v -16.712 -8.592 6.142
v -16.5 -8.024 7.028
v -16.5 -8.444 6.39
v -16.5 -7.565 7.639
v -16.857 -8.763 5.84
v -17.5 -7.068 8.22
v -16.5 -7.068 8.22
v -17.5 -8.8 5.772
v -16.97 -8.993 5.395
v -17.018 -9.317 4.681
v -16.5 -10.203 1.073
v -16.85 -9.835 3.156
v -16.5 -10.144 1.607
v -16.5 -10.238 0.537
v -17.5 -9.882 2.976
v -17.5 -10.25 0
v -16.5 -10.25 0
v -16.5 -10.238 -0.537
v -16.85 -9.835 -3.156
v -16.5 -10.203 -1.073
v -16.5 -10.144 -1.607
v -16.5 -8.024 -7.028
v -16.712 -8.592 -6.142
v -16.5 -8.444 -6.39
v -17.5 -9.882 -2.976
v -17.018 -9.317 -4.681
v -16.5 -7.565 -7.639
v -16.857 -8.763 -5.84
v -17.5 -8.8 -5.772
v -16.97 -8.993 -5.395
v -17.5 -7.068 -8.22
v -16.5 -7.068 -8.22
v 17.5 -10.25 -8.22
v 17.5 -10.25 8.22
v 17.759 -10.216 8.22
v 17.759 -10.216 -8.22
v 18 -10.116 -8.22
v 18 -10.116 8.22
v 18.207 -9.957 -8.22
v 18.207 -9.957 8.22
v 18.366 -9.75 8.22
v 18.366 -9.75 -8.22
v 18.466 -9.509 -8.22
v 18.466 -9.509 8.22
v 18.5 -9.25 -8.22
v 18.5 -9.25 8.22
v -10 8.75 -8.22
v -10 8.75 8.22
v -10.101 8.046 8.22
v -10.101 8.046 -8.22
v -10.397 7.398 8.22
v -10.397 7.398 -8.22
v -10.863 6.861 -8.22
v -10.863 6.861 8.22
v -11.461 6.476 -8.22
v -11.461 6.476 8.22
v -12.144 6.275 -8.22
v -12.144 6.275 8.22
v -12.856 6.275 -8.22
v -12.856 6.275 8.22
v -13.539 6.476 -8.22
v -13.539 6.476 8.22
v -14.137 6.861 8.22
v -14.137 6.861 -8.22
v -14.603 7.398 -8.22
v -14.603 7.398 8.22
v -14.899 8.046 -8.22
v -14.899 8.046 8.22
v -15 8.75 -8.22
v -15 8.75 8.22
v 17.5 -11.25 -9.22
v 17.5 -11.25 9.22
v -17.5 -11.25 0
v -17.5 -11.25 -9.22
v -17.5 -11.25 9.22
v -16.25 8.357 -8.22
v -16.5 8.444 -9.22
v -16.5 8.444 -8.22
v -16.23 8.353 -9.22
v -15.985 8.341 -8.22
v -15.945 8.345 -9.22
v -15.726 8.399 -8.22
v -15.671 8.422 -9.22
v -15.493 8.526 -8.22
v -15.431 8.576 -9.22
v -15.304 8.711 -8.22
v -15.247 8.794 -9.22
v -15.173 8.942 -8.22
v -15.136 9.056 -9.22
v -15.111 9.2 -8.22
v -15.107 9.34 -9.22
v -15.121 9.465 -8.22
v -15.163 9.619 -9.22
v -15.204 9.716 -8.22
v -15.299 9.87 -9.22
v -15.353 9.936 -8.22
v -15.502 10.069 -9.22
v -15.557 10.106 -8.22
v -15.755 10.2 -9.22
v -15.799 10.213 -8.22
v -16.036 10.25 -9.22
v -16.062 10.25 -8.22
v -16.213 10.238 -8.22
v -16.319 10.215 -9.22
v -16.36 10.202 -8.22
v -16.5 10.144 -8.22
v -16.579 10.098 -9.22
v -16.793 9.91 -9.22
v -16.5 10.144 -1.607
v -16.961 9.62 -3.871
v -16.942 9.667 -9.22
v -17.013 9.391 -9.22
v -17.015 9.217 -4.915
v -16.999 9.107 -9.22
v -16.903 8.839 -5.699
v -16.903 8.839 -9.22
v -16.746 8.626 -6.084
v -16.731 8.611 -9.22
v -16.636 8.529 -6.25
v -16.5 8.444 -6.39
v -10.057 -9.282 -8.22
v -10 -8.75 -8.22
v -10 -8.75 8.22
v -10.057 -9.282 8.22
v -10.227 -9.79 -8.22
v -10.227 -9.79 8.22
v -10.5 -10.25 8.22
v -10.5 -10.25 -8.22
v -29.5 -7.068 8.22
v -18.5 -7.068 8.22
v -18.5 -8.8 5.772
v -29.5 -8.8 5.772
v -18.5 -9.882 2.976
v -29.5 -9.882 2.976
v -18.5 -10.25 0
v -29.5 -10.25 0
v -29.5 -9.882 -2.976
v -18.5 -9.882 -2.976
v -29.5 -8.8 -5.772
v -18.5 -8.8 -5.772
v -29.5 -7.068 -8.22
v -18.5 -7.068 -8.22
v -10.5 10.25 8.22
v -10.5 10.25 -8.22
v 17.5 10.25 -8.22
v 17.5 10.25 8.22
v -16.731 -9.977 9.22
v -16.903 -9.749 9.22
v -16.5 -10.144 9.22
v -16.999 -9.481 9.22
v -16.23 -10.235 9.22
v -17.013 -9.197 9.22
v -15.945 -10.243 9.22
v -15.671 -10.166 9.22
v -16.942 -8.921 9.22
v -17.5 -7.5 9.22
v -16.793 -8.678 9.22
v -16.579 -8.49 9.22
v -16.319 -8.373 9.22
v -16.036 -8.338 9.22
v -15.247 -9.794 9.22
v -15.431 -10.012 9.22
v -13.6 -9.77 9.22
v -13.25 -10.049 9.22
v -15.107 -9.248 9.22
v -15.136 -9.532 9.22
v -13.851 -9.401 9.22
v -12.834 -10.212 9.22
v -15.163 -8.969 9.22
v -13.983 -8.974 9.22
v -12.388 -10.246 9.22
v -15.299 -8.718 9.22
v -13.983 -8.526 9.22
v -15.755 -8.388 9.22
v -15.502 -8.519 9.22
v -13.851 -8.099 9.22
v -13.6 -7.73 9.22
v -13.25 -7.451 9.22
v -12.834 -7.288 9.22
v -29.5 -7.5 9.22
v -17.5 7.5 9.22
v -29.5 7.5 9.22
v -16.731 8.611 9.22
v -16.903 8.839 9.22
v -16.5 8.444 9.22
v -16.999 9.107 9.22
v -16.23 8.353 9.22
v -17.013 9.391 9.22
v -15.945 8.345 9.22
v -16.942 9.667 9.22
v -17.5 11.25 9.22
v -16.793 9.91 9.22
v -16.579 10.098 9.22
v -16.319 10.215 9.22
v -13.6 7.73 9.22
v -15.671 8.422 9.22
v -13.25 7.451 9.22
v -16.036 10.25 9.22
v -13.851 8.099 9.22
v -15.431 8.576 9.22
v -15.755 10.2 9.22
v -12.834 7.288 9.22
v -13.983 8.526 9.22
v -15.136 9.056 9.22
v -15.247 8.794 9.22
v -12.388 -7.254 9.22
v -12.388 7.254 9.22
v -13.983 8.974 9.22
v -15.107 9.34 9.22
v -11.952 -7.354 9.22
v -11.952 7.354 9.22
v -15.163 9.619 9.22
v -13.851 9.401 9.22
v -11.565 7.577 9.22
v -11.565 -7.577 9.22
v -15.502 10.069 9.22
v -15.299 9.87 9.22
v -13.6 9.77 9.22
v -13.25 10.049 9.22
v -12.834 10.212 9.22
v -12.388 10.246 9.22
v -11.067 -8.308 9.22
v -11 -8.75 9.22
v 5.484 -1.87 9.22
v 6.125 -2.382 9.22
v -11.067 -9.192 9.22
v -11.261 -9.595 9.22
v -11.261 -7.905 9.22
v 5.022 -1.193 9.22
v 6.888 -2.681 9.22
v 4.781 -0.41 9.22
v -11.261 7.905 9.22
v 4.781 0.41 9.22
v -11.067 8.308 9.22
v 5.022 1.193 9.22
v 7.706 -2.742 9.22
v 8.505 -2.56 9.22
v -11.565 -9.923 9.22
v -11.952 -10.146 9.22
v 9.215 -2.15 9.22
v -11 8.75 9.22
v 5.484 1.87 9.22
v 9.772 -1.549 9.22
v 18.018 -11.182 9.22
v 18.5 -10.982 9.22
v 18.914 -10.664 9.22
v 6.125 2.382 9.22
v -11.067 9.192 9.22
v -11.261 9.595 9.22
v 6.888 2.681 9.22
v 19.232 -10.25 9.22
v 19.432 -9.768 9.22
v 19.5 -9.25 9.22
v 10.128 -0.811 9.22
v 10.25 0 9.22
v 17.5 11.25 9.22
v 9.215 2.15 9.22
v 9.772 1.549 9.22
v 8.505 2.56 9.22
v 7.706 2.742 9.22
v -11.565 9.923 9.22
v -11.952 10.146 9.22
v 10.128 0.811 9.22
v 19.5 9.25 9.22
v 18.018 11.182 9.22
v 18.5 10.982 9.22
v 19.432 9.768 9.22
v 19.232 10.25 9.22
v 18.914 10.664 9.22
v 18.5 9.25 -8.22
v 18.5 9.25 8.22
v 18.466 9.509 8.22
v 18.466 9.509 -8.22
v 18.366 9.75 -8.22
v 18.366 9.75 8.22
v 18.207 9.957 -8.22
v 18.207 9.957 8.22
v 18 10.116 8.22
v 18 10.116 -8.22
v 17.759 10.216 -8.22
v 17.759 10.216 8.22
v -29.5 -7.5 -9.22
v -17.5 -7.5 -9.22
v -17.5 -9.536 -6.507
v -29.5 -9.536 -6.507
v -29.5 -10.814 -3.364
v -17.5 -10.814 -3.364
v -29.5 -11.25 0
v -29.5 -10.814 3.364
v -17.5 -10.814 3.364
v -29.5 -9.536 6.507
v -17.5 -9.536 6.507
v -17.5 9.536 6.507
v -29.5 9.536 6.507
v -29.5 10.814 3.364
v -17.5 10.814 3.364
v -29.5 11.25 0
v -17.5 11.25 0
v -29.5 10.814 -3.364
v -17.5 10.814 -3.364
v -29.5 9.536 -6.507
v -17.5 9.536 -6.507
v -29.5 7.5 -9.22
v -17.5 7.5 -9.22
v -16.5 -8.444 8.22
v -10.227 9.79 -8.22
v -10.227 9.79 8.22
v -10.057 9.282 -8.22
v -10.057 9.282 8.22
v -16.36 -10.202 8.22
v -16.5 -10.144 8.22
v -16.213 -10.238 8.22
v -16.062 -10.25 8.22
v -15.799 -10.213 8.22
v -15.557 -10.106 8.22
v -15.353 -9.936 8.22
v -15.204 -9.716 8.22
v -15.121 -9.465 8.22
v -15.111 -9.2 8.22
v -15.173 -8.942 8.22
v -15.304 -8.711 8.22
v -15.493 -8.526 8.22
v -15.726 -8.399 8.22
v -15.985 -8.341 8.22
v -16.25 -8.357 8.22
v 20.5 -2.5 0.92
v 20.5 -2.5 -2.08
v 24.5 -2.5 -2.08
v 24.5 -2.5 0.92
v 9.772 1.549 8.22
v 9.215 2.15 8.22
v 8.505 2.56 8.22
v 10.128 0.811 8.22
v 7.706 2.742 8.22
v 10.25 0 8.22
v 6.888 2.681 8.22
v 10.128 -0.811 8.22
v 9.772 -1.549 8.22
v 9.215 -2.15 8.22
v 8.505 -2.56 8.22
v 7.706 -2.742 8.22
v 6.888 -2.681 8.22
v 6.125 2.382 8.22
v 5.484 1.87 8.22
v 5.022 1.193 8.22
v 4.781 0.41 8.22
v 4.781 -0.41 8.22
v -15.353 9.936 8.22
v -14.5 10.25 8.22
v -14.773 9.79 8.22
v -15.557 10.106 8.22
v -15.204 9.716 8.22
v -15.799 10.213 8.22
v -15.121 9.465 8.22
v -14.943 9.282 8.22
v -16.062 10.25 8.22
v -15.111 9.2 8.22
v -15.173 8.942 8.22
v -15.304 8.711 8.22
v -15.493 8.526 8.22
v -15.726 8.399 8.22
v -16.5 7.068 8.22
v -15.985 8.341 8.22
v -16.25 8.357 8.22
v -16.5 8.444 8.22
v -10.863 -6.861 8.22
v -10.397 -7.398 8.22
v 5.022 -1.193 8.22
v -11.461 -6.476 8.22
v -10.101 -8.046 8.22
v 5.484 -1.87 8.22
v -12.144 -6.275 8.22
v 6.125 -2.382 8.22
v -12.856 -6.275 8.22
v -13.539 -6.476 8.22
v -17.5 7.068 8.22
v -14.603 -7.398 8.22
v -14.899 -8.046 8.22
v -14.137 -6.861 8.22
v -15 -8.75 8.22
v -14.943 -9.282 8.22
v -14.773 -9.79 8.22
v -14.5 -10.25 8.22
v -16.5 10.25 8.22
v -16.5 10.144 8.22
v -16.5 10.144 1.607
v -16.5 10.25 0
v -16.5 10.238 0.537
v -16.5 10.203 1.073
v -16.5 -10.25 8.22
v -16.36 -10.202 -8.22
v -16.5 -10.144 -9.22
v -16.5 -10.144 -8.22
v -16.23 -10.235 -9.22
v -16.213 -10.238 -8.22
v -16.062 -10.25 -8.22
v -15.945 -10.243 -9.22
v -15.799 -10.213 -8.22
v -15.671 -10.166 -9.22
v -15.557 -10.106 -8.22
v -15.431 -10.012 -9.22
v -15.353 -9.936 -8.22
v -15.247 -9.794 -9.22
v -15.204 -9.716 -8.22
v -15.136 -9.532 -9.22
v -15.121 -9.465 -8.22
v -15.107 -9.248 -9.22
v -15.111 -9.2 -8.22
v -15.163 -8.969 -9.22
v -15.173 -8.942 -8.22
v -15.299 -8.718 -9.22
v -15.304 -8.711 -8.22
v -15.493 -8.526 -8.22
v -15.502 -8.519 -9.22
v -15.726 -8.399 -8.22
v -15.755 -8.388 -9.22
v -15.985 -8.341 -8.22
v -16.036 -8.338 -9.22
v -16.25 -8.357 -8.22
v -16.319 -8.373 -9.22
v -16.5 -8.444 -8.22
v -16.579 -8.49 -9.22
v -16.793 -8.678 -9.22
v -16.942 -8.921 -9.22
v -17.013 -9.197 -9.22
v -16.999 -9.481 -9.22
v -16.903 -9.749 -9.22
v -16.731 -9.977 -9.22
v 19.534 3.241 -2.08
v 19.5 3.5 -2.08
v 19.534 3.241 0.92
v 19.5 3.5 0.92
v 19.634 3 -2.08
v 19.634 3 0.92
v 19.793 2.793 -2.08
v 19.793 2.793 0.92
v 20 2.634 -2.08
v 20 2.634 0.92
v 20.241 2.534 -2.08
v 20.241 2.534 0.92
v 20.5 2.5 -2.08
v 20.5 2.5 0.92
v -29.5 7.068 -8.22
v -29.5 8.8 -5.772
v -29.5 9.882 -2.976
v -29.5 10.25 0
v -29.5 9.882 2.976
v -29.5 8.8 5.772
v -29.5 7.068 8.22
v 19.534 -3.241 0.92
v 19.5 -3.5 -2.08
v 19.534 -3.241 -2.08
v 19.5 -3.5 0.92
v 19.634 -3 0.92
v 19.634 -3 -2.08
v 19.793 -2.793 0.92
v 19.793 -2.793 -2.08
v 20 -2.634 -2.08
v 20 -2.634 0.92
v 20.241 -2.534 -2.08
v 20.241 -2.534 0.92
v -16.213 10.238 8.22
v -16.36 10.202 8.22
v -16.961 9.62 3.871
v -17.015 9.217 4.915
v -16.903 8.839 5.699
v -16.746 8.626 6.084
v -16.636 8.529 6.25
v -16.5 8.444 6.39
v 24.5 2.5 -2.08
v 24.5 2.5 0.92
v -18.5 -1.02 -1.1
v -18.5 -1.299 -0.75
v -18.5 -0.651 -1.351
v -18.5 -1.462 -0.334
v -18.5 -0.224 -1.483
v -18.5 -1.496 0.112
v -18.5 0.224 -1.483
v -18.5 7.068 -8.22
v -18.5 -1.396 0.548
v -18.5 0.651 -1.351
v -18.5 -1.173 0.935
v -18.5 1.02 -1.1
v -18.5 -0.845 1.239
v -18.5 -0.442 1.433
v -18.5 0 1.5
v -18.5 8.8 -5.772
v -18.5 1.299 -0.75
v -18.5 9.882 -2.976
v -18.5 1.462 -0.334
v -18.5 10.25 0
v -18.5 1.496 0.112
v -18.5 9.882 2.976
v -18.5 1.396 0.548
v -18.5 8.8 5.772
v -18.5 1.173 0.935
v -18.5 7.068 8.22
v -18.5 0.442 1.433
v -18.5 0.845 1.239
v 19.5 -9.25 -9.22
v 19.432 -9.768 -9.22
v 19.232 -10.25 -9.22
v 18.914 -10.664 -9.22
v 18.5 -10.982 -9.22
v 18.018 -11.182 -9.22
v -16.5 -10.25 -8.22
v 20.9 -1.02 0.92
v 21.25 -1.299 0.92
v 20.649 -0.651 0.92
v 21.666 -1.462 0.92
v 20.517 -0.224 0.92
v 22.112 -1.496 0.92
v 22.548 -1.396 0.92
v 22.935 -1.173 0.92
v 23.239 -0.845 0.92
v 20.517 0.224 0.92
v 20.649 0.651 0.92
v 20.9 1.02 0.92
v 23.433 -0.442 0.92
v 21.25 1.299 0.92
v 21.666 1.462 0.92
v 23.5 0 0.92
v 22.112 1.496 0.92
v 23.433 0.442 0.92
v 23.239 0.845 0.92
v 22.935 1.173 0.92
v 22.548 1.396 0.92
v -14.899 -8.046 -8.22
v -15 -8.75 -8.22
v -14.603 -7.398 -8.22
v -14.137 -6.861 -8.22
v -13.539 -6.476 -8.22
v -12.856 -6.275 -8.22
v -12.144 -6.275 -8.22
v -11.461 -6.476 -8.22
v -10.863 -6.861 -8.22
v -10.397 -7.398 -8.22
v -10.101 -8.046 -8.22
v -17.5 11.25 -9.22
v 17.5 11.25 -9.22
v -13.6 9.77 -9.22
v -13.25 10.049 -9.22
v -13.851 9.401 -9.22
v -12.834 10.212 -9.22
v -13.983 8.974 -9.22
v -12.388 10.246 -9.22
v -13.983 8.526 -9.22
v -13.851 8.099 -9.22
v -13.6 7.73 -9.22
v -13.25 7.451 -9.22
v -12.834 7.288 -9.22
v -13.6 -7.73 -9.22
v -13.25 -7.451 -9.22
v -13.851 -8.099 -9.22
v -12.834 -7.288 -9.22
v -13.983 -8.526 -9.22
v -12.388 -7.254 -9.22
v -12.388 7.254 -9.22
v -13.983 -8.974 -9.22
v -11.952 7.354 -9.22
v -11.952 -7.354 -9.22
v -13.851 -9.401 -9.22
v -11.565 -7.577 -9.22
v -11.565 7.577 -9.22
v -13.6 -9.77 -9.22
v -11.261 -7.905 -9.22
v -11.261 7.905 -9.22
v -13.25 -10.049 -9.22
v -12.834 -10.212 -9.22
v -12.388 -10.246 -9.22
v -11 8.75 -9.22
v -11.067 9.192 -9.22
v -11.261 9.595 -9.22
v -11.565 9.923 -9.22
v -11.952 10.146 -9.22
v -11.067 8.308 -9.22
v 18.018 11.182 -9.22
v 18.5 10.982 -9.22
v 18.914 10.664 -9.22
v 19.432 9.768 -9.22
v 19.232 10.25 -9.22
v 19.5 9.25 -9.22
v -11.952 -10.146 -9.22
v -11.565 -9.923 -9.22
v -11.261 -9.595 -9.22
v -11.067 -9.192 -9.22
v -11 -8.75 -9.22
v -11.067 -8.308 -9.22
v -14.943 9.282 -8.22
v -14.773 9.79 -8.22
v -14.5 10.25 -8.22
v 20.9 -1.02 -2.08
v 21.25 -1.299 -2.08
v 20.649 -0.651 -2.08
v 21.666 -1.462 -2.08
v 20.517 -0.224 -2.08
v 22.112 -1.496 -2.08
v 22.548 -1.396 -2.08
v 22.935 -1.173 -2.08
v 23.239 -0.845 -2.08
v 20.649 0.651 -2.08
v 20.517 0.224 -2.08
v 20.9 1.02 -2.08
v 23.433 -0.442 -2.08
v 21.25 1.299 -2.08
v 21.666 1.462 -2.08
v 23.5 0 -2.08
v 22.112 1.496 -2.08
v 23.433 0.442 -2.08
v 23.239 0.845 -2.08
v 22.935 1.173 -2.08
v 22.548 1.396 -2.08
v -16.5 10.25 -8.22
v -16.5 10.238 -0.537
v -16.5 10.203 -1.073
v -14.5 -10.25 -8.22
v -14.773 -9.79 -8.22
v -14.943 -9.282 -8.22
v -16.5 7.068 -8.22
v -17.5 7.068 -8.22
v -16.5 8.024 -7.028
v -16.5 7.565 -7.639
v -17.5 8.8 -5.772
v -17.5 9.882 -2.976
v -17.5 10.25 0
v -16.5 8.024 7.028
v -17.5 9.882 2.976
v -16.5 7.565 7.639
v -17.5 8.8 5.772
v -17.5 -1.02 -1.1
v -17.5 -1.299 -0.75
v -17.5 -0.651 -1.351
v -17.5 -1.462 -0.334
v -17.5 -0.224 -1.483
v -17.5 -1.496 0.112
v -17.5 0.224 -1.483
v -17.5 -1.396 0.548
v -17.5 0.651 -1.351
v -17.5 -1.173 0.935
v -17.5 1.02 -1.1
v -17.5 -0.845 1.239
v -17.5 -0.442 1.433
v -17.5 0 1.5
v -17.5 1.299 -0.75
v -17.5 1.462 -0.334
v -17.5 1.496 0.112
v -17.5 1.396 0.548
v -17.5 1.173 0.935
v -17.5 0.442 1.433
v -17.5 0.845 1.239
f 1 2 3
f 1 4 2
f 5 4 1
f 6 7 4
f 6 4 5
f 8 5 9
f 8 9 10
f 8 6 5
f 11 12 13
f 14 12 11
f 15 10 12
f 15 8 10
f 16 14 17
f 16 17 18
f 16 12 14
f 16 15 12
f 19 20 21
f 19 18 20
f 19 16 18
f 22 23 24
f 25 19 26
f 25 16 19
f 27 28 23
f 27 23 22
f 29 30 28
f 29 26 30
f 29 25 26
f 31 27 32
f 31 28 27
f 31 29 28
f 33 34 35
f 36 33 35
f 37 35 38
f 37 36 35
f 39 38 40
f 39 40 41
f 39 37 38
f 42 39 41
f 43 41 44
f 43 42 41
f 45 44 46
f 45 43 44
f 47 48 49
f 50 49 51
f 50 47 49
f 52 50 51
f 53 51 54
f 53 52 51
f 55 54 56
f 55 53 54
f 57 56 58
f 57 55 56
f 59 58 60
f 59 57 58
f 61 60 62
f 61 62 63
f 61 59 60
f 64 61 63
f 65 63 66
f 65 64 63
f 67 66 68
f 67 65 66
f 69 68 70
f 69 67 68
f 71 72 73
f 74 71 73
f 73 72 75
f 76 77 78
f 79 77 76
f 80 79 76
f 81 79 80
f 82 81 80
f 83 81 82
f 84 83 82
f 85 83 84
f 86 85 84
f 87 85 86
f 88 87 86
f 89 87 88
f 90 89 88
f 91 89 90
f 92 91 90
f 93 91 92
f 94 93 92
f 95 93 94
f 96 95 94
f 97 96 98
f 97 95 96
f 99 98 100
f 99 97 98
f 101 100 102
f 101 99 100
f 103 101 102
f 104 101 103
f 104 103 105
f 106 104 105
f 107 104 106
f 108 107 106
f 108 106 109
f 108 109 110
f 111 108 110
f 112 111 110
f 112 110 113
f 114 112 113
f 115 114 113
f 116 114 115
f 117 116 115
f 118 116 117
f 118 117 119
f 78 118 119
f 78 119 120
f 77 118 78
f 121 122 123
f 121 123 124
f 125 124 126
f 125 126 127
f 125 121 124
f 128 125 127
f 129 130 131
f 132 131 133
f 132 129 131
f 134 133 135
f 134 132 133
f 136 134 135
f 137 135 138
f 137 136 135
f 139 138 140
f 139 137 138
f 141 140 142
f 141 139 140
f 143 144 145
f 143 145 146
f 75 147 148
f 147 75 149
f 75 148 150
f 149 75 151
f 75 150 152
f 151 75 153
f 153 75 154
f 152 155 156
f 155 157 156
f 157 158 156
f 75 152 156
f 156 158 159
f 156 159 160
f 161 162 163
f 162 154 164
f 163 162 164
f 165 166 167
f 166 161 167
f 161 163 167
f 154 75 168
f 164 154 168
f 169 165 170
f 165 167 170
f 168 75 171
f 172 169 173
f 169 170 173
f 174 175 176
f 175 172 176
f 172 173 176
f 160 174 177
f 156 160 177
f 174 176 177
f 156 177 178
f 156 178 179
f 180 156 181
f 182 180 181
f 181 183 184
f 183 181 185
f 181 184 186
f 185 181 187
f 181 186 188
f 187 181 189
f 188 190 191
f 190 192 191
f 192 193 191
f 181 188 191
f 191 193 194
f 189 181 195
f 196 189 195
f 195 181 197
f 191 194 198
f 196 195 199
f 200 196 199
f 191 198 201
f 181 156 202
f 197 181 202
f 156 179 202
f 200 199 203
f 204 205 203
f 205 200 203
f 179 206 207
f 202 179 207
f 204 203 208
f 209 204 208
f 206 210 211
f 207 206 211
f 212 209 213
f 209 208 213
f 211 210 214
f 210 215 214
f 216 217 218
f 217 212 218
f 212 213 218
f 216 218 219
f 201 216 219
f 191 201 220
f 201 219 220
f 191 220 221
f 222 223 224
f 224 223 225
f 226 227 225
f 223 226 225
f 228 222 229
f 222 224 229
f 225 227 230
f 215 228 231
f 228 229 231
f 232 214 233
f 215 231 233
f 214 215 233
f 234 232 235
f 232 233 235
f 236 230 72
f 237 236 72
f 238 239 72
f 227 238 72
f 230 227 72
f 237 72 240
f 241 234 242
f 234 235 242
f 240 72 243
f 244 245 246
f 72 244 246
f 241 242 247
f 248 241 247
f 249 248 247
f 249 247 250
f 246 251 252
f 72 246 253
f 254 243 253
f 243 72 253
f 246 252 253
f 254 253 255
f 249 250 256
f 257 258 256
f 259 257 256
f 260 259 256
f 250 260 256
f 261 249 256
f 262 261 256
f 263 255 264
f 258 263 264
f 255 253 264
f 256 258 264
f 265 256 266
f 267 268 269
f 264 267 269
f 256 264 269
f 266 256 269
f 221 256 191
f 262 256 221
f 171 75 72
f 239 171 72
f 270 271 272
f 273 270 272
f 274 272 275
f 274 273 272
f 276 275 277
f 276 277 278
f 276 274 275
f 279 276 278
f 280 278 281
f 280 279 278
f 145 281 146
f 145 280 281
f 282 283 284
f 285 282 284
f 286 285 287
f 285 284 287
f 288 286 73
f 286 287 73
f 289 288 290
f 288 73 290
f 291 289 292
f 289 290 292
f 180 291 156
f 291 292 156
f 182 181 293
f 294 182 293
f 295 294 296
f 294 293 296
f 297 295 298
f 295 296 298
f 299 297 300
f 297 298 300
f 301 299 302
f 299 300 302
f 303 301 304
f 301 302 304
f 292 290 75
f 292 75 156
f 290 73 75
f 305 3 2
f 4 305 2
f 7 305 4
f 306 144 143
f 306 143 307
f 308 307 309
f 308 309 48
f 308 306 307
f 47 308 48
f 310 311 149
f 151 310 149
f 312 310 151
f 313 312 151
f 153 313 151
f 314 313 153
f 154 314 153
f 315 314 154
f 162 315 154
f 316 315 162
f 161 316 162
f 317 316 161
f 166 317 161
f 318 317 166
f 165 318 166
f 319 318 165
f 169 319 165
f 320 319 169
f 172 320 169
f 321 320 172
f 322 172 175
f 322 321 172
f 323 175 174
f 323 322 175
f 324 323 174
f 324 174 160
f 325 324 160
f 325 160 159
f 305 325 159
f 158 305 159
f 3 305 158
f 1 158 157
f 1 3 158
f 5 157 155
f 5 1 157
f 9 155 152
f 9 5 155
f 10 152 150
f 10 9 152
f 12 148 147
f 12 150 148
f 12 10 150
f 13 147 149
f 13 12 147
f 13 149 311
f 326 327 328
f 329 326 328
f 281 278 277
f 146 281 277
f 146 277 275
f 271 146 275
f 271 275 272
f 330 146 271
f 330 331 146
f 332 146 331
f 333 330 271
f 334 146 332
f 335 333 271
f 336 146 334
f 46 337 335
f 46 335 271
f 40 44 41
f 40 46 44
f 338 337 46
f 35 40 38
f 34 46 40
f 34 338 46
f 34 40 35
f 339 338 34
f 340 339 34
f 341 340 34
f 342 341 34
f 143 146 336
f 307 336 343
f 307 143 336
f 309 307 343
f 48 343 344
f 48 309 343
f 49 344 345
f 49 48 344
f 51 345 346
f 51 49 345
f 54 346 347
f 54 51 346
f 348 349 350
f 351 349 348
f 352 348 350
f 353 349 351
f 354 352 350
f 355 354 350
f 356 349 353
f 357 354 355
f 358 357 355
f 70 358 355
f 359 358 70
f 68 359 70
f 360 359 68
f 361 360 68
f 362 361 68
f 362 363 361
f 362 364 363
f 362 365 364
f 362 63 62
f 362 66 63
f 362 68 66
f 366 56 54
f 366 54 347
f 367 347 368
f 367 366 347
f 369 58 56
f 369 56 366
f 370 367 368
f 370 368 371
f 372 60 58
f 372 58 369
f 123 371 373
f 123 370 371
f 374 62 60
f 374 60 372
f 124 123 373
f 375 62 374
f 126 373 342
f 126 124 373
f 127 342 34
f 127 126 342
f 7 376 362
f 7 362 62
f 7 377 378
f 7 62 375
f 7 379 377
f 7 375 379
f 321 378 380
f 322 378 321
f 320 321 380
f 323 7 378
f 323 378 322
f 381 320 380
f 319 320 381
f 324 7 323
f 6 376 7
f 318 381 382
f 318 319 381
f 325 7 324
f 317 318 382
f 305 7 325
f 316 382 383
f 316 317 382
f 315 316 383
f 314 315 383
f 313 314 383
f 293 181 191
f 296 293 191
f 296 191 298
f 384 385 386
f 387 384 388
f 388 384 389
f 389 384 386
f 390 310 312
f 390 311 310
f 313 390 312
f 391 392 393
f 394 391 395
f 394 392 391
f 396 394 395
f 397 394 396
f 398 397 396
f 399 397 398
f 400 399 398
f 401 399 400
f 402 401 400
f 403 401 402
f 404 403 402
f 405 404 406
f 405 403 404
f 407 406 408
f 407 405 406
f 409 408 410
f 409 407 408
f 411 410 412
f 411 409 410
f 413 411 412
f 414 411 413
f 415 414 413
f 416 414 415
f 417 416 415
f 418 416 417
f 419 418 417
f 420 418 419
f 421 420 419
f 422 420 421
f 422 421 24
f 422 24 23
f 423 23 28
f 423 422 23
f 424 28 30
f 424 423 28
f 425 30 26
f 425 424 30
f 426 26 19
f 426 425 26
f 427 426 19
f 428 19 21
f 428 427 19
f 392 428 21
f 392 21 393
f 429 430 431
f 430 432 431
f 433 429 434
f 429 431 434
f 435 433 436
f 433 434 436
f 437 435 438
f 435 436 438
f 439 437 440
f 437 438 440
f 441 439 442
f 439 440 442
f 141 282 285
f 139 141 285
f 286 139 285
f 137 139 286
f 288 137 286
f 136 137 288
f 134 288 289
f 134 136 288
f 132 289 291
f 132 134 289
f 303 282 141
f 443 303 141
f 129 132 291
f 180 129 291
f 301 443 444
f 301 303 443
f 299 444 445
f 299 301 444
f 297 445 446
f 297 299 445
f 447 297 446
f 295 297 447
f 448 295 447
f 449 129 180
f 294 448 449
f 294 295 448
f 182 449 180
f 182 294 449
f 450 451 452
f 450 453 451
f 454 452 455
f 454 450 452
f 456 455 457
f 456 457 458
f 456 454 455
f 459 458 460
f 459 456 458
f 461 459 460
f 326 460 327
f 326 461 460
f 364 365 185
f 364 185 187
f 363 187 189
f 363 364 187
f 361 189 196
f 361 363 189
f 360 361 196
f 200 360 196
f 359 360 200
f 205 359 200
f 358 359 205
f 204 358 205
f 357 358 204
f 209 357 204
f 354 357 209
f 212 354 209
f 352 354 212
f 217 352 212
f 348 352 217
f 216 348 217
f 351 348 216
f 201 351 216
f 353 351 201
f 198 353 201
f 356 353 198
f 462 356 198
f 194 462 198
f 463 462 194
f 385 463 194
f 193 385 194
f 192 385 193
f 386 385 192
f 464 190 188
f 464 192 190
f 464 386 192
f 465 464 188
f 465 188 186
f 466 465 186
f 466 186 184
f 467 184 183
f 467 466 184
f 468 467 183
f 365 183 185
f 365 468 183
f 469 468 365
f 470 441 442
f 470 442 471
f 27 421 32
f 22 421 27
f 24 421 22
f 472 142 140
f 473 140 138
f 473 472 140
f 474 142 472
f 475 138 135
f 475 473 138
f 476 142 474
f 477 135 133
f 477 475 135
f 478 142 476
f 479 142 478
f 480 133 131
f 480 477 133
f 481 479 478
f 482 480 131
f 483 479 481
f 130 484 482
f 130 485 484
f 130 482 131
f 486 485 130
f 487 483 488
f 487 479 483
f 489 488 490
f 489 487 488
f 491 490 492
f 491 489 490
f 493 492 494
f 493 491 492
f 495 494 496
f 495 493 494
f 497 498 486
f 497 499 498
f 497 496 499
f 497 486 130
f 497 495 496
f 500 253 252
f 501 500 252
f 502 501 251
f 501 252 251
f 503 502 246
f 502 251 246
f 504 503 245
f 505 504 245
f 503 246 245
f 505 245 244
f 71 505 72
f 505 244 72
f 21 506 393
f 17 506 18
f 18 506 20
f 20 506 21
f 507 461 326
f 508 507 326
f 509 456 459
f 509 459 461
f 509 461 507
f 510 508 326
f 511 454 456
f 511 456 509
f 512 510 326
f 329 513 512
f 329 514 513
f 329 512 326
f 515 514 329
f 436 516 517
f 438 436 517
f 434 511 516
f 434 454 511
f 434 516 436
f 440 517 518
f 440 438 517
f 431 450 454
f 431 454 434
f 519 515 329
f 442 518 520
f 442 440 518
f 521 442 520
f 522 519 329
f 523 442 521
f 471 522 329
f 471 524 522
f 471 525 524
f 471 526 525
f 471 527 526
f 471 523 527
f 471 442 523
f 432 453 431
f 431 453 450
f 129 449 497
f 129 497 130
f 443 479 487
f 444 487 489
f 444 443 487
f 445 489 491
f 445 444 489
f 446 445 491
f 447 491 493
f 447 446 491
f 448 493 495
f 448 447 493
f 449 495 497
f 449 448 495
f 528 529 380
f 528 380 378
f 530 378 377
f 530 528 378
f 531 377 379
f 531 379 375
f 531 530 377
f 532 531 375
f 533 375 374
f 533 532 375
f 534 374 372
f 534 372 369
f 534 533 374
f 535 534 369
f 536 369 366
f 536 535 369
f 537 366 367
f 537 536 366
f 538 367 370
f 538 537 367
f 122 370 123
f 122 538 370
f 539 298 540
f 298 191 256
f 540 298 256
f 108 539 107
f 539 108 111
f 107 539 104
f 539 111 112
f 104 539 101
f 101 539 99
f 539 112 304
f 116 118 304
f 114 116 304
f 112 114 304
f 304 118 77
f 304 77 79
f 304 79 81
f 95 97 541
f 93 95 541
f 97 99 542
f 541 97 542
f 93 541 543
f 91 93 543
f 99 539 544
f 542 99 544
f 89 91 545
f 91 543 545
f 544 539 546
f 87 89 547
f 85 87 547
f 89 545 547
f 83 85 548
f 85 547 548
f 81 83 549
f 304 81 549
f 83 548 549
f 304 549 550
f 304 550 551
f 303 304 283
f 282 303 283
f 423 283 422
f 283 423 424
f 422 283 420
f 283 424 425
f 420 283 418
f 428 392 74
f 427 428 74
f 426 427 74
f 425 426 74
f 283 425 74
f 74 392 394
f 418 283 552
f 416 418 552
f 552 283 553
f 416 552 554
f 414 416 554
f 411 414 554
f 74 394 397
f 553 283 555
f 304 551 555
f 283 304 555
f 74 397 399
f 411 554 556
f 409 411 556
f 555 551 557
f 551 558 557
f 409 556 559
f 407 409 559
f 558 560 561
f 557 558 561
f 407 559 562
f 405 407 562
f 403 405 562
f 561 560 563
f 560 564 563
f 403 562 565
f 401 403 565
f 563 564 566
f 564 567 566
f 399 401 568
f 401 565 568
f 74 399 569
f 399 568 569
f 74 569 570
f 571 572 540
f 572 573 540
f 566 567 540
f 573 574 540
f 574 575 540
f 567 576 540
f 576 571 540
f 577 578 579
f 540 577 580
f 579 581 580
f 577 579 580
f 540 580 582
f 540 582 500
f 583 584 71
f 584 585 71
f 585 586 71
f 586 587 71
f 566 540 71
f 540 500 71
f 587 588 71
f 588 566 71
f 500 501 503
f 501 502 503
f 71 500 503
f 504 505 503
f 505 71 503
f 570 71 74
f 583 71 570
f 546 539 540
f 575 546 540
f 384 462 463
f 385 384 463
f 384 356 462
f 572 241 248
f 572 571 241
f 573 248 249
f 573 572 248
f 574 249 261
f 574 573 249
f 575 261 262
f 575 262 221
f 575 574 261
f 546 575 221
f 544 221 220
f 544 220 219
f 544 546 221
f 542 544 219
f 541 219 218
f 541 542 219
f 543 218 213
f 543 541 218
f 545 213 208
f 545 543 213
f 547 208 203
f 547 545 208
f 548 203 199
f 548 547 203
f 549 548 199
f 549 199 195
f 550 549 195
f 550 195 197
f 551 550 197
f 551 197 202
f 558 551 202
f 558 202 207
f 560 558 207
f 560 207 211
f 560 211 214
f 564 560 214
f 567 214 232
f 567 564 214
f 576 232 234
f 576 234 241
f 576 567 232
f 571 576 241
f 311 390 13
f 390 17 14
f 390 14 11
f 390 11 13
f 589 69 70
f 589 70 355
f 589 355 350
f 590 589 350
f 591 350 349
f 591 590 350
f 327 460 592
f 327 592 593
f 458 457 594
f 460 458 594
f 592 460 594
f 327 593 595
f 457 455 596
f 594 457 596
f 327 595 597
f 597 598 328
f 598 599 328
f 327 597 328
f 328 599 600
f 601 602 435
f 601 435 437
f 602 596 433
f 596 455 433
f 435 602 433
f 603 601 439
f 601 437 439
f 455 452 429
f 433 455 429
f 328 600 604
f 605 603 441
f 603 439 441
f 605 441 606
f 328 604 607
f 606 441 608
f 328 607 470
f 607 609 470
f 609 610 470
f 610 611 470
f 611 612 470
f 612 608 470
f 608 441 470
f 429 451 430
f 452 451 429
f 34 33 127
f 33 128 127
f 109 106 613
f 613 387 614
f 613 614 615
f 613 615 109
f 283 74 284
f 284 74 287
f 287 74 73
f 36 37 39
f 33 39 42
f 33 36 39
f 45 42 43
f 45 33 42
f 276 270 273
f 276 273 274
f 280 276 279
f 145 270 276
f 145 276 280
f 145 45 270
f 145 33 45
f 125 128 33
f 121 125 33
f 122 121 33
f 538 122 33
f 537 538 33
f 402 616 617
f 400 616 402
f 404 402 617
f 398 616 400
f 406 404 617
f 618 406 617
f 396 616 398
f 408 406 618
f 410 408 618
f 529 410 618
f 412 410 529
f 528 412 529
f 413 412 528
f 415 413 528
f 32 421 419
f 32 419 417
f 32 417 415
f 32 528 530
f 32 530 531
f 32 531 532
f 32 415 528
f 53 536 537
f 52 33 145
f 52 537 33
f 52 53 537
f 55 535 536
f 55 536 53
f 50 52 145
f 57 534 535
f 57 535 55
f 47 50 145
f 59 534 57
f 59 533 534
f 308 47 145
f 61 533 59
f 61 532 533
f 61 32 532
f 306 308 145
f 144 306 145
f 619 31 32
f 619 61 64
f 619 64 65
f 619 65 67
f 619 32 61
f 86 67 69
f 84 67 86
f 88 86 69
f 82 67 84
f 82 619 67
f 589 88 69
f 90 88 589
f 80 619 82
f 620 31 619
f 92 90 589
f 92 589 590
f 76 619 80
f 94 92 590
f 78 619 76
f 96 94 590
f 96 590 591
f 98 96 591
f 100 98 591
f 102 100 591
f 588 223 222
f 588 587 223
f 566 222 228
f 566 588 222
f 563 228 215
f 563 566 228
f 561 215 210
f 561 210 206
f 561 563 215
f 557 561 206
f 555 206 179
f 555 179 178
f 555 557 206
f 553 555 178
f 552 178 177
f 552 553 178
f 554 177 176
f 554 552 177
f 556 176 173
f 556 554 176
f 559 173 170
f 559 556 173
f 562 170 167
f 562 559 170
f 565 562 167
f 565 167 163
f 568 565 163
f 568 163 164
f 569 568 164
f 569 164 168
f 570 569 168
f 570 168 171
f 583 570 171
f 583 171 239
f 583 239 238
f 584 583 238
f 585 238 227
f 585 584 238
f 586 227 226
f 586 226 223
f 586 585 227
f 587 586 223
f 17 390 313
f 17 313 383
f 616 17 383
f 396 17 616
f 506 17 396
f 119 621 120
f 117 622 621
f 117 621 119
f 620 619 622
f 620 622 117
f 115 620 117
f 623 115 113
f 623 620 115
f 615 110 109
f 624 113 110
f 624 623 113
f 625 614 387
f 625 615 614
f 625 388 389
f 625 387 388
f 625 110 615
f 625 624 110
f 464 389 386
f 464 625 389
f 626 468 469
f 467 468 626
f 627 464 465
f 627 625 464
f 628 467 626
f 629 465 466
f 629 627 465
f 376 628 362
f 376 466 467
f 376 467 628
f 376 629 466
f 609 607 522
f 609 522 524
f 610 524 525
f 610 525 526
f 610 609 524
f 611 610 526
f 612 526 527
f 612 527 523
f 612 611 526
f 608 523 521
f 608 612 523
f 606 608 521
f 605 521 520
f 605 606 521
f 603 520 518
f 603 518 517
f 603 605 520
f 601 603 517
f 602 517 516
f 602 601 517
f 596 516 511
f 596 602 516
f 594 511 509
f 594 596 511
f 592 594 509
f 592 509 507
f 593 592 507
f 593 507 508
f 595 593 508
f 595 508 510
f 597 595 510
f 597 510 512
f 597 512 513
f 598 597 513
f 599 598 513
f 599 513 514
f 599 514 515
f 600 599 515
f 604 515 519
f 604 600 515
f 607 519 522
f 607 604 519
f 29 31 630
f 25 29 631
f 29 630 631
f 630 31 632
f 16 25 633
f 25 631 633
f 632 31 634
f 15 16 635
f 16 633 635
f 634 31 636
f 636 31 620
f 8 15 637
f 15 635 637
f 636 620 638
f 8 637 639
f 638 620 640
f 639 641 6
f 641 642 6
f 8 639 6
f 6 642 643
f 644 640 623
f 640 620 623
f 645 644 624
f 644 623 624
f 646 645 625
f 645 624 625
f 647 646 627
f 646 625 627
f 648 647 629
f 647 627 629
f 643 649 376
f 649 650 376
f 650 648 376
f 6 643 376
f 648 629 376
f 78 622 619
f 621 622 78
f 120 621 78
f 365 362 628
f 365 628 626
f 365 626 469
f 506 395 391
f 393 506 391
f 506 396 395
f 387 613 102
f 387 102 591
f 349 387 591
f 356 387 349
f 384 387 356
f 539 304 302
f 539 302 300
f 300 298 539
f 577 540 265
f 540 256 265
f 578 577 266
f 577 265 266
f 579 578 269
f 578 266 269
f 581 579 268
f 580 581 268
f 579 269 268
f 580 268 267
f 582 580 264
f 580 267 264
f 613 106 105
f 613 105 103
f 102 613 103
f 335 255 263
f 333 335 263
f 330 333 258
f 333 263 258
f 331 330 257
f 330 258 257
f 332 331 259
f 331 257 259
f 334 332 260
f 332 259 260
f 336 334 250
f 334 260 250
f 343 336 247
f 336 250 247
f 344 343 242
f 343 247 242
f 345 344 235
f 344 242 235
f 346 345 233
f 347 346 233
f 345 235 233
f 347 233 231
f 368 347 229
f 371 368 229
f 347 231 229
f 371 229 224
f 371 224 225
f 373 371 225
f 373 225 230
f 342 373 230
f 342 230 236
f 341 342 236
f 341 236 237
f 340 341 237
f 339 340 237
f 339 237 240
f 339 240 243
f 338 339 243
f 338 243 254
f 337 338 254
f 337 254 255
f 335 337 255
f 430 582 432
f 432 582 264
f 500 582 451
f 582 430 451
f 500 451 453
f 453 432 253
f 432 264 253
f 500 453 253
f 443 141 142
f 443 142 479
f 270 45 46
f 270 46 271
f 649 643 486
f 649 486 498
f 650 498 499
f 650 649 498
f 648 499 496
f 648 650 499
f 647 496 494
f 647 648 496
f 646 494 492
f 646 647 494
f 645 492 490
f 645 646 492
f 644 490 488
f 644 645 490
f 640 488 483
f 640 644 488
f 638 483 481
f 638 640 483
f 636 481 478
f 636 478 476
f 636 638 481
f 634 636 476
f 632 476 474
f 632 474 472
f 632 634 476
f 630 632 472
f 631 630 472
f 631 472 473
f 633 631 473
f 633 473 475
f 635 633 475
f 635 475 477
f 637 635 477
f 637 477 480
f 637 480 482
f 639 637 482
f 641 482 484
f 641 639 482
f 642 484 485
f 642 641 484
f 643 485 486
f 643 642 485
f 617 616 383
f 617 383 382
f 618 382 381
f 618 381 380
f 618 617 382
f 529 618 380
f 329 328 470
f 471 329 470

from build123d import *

# Parameters (mm, degrees)
SKETCH1_R                = 1.5
BOSS_EXTRUDE1_DEPTH      = 9.22
BOSS_EXTRUDE2_DEPTH      = 12
SHELL1_START             = -10
SHELL1_OUTLINE_W         = 20.5
SHELL1_OUTLINE_H         = 16.44
SHELL1_DEPTH             = 27.5
SHELL1_START_2           = -29.5
SHELL1_2_DEPTH           = 14.5
SHELL1_START_3           = -16.5
SHELL1_3_DEPTH           = 1.5
SHELL1_START_4           = -8.22
SHELL1_4_DEPTH           = 16.44
SKETCH3_R                = 1.5
BOSS_EXTRUDE3_DEPTH      = 1
BOSS_EXTRUDE4_DEPTH      = 1.5
BOSS_EXTRUDE4_DEPTH_BACK = 1.5
SKETCH6_W                = 5
SKETCH6_H                = 5
SKETCH6_R                = 1.5
SKETCH7_R                = 2.75
CUT_EXTRUDE1_DEPTH       = 3
FILLET1_R                = 1
CUT_EXTRUDE2_DEPTH       = 20
CUT_EXTRUDE2_DEPTH_BACK  = 20
SKETCH8_R                = 0.956029162


with BuildPart() as part:
    # Sketch1 → Boss-Extrude1 (new, symmetric)
    with BuildSketch(Plane.XY):
        with BuildLine():
            Line((17.5, -11.25), (-17.5, -11.25))
            Line((-17.5, -11.25), (-17.5, 11.25))
            Line((-17.5, 11.25), (17.5, 11.25))
            ThreePointArc((17.5, 11.25), (18.914213562, 10.664213562), (19.5, 9.25))
            Line((19.5, 9.25), (19.5, -9.25))
            ThreePointArc((19.5, -9.25), (18.914213562, -10.664213562), (17.5, -11.25))
        make_face()
        with Locations((-12.5, 8.75)):
            Circle(SKETCH1_R, mode=Mode.SUBTRACT)
        with Locations((-12.5, -8.75)):
            Circle(SKETCH1_R, mode=Mode.SUBTRACT)
    extrude(amount=BOSS_EXTRUDE1_DEPTH, both=True)

    # Sketch2 → Boss-Extrude2 (add)
    with BuildSketch(Plane.ZY.offset(17.5)):
        with BuildLine():
            Line((9.22, -7.5), (9.22, 7.5))
            ThreePointArc((9.22, 7.5), (0, 11.25), (-9.22, 7.5))
            Line((-9.22, 7.5), (-9.22, -7.5))
            ThreePointArc((-9.22, -7.5), (0, -11.25), (9.22, -7.5))
        make_face()
    extrude(amount=BOSS_EXTRUDE2_DEPTH)

    # Shell1: read off the stored shape, not the designer's step
    # Shell1 outline → Shell1 (cut)
    with BuildSketch(Plane.YZ.offset(SHELL1_START)):
        Rectangle(SHELL1_OUTLINE_W, SHELL1_OUTLINE_H)
    extrude(amount=SHELL1_DEPTH, mode=Mode.SUBTRACT)

    # Shell1 2 outline → Shell1 2 (cut)
    with BuildSketch(Plane.YZ.offset(SHELL1_START_2)):
        with BuildLine():
            ThreePointArc((7.068411902, -8.22), (10.25, 0), (7.068411902, 8.22))
            Line((7.068411902, 8.22), (-7.068411902, 8.22))
            ThreePointArc((-7.068411902, 8.22), (-10.25, 0), (-7.068411902, -8.22))
            Line((-7.068411902, -8.22), (7.068411902, -8.22))
        make_face()
    extrude(amount=SHELL1_2_DEPTH, mode=Mode.SUBTRACT)

    # Shell1 3 outline → Shell1 3 (cut)
    with BuildSketch(Plane.YZ.offset(SHELL1_START_3)):
        with BuildLine():
            Line((10.25, 0), (10.25, 8.22))
            Line((10.25, 8.22), (7.068411902, 8.22))
            ThreePointArc((7.068411902, 8.22), (9.426855331, 4.407122157), (10.25, 0))
        make_face()
        with BuildLine():
            Line((10.25, -8.22), (10.25, 0))
            ThreePointArc((10.25, 0), (9.426855331, -4.407122157), (7.068411902, -8.22))
            Line((7.068411902, -8.22), (10.25, -8.22))
        make_face()
        with BuildLine():
            ThreePointArc((-10.25, 0), (-9.426855331, 4.407122157), (-7.068411902, 8.22))
            Line((-7.068411902, 8.22), (-10.25, 8.22))
            Line((-10.25, 8.22), (-10.25, 0))
        make_face()
        with BuildLine():
            Line((-10.25, -8.22), (-7.068411902, -8.22))
            ThreePointArc((-7.068411902, -8.22), (-9.426855331, -4.407122157), (-10.25, 0))
            Line((-10.25, 0), (-10.25, -8.22))
        make_face()
    extrude(amount=SHELL1_3_DEPTH, mode=Mode.SUBTRACT)

    # Shell1 4 outline → Shell1 4 (cut)
    with BuildSketch(Plane.XY.offset(SHELL1_START_4)):
        with BuildLine():
            ThreePointArc((-14.5, -10.25), (-14.871708245, -9.540569415), (-15, -8.75))
            Line((-15, -8.75), (-15, -10.25))
            Line((-15, -10.25), (-14.5, -10.25))
        make_face()
        with BuildLine():
            ThreePointArc((-10, 8.75), (-12.499999993, 6.25), (-15, 8.749999987))
            Line((-15, 8.749999987), (-15, -8.75))
            ThreePointArc((-15, -8.75), (-12.5, -6.25), (-10, -8.75))
            Line((-10, -8.75), (-10, 8.75))
        make_face()
        with BuildLine():
            Line((-14.5, 10.25), (-15, 10.25))
            Line((-15, 10.25), (-15, 8.749999987))
            ThreePointArc((-15, 8.749999987), (-14.871708247, 9.540569409), (-14.5, 10.25))
        make_face()
        with BuildLine():
            ThreePointArc((-10.5, 10.25), (-10.128291755, 9.540569415), (-10, 8.75))
            Line((-10, 8.75), (-10, 10.25))
            Line((-10, 10.25), (-10.5, 10.25))
        make_face()
        with BuildLine():
            Line((-10, -10.25), (-10, -8.75))
            ThreePointArc((-10, -8.75), (-10.128291755, -9.540569415), (-10.5, -10.25))
            Line((-10.5, -10.25), (-10, -10.25))
        make_face()
        with BuildLine():
            ThreePointArc((18.5, 9.25), (18.207106781, 9.957106781), (17.5, 10.25))
            Line((17.5, 10.25), (17.5, -10.25))
            ThreePointArc((17.5, -10.25), (18.207106781, -9.957106781), (18.5, -9.25))
            Line((18.5, -9.25), (18.5, 9.25))
        make_face()
    extrude(amount=SHELL1_4_DEPTH, mode=Mode.SUBTRACT)

    # Sketch3 → Boss-Extrude3 (add)
    with BuildSketch(Plane.ZY.offset(17.5)):
        with BuildLine():
            Line((-9.22, 7.5), (-9.22, -7.5))
            ThreePointArc((-9.22, -7.5), (0, -11.25), (9.22, -7.5))
            Line((9.22, -7.5), (9.22, 7.5))
            ThreePointArc((9.22, 7.5), (0, 11.25), (-9.22, 7.5))
        make_face()
        Circle(SKETCH3_R, mode=Mode.SUBTRACT)
    extrude(amount=BOSS_EXTRUDE3_DEPTH)

    # Sketch6 → Boss-Extrude4 (add, two sides: drawn at the far end of the back side and taken through both)
    with BuildSketch(Plane.XY.offset(-0.58).offset(-BOSS_EXTRUDE4_DEPTH_BACK)):
        with Locations((22, 0)):
            Rectangle(SKETCH6_W, SKETCH6_H)
        with Locations((22, 0)):
            Circle(SKETCH6_R, mode=Mode.SUBTRACT)
    extrude(amount=BOSS_EXTRUDE4_DEPTH + BOSS_EXTRUDE4_DEPTH_BACK)

    # Sketch7 → Cut-Extrude1 (cut)
    with BuildSketch(Plane.XY.offset(9.22)):
        with Locations((7.5, 0)):
            Circle(SKETCH7_R)
    extrude(amount=-CUT_EXTRUDE1_DEPTH, mode=Mode.SUBTRACT)

    # Fillet1
    fillet1_edges = [part.edges().sort_by_distance(p)[0] for p in [
        (19.5, 2.5, -0.58),
        (19.5, -2.5, -0.58),
    ]]
    fillet(fillet1_edges, radius=FILLET1_R)

    # Sketch8 → Cut-Extrude2 (cut, two sides: drawn at the far end of the back side and taken through both)
    with BuildSketch(Plane.XY.offset(-0.58).offset(-CUT_EXTRUDE2_DEPTH_BACK)):
        with Locations(Location((-16.061963922, 9.293970838, 0), (0, 0, 242.73008166))):
            Circle(SKETCH8_R)
        with Locations(Location((-16.061963922, -9.293970838, 0), (0, 0, 242.730056197))):
            Circle(SKETCH8_R)
    extrude(amount=CUT_EXTRUDE2_DEPTH + CUT_EXTRUDE2_DEPTH_BACK, mode=Mode.SUBTRACT)


solid = part.part
